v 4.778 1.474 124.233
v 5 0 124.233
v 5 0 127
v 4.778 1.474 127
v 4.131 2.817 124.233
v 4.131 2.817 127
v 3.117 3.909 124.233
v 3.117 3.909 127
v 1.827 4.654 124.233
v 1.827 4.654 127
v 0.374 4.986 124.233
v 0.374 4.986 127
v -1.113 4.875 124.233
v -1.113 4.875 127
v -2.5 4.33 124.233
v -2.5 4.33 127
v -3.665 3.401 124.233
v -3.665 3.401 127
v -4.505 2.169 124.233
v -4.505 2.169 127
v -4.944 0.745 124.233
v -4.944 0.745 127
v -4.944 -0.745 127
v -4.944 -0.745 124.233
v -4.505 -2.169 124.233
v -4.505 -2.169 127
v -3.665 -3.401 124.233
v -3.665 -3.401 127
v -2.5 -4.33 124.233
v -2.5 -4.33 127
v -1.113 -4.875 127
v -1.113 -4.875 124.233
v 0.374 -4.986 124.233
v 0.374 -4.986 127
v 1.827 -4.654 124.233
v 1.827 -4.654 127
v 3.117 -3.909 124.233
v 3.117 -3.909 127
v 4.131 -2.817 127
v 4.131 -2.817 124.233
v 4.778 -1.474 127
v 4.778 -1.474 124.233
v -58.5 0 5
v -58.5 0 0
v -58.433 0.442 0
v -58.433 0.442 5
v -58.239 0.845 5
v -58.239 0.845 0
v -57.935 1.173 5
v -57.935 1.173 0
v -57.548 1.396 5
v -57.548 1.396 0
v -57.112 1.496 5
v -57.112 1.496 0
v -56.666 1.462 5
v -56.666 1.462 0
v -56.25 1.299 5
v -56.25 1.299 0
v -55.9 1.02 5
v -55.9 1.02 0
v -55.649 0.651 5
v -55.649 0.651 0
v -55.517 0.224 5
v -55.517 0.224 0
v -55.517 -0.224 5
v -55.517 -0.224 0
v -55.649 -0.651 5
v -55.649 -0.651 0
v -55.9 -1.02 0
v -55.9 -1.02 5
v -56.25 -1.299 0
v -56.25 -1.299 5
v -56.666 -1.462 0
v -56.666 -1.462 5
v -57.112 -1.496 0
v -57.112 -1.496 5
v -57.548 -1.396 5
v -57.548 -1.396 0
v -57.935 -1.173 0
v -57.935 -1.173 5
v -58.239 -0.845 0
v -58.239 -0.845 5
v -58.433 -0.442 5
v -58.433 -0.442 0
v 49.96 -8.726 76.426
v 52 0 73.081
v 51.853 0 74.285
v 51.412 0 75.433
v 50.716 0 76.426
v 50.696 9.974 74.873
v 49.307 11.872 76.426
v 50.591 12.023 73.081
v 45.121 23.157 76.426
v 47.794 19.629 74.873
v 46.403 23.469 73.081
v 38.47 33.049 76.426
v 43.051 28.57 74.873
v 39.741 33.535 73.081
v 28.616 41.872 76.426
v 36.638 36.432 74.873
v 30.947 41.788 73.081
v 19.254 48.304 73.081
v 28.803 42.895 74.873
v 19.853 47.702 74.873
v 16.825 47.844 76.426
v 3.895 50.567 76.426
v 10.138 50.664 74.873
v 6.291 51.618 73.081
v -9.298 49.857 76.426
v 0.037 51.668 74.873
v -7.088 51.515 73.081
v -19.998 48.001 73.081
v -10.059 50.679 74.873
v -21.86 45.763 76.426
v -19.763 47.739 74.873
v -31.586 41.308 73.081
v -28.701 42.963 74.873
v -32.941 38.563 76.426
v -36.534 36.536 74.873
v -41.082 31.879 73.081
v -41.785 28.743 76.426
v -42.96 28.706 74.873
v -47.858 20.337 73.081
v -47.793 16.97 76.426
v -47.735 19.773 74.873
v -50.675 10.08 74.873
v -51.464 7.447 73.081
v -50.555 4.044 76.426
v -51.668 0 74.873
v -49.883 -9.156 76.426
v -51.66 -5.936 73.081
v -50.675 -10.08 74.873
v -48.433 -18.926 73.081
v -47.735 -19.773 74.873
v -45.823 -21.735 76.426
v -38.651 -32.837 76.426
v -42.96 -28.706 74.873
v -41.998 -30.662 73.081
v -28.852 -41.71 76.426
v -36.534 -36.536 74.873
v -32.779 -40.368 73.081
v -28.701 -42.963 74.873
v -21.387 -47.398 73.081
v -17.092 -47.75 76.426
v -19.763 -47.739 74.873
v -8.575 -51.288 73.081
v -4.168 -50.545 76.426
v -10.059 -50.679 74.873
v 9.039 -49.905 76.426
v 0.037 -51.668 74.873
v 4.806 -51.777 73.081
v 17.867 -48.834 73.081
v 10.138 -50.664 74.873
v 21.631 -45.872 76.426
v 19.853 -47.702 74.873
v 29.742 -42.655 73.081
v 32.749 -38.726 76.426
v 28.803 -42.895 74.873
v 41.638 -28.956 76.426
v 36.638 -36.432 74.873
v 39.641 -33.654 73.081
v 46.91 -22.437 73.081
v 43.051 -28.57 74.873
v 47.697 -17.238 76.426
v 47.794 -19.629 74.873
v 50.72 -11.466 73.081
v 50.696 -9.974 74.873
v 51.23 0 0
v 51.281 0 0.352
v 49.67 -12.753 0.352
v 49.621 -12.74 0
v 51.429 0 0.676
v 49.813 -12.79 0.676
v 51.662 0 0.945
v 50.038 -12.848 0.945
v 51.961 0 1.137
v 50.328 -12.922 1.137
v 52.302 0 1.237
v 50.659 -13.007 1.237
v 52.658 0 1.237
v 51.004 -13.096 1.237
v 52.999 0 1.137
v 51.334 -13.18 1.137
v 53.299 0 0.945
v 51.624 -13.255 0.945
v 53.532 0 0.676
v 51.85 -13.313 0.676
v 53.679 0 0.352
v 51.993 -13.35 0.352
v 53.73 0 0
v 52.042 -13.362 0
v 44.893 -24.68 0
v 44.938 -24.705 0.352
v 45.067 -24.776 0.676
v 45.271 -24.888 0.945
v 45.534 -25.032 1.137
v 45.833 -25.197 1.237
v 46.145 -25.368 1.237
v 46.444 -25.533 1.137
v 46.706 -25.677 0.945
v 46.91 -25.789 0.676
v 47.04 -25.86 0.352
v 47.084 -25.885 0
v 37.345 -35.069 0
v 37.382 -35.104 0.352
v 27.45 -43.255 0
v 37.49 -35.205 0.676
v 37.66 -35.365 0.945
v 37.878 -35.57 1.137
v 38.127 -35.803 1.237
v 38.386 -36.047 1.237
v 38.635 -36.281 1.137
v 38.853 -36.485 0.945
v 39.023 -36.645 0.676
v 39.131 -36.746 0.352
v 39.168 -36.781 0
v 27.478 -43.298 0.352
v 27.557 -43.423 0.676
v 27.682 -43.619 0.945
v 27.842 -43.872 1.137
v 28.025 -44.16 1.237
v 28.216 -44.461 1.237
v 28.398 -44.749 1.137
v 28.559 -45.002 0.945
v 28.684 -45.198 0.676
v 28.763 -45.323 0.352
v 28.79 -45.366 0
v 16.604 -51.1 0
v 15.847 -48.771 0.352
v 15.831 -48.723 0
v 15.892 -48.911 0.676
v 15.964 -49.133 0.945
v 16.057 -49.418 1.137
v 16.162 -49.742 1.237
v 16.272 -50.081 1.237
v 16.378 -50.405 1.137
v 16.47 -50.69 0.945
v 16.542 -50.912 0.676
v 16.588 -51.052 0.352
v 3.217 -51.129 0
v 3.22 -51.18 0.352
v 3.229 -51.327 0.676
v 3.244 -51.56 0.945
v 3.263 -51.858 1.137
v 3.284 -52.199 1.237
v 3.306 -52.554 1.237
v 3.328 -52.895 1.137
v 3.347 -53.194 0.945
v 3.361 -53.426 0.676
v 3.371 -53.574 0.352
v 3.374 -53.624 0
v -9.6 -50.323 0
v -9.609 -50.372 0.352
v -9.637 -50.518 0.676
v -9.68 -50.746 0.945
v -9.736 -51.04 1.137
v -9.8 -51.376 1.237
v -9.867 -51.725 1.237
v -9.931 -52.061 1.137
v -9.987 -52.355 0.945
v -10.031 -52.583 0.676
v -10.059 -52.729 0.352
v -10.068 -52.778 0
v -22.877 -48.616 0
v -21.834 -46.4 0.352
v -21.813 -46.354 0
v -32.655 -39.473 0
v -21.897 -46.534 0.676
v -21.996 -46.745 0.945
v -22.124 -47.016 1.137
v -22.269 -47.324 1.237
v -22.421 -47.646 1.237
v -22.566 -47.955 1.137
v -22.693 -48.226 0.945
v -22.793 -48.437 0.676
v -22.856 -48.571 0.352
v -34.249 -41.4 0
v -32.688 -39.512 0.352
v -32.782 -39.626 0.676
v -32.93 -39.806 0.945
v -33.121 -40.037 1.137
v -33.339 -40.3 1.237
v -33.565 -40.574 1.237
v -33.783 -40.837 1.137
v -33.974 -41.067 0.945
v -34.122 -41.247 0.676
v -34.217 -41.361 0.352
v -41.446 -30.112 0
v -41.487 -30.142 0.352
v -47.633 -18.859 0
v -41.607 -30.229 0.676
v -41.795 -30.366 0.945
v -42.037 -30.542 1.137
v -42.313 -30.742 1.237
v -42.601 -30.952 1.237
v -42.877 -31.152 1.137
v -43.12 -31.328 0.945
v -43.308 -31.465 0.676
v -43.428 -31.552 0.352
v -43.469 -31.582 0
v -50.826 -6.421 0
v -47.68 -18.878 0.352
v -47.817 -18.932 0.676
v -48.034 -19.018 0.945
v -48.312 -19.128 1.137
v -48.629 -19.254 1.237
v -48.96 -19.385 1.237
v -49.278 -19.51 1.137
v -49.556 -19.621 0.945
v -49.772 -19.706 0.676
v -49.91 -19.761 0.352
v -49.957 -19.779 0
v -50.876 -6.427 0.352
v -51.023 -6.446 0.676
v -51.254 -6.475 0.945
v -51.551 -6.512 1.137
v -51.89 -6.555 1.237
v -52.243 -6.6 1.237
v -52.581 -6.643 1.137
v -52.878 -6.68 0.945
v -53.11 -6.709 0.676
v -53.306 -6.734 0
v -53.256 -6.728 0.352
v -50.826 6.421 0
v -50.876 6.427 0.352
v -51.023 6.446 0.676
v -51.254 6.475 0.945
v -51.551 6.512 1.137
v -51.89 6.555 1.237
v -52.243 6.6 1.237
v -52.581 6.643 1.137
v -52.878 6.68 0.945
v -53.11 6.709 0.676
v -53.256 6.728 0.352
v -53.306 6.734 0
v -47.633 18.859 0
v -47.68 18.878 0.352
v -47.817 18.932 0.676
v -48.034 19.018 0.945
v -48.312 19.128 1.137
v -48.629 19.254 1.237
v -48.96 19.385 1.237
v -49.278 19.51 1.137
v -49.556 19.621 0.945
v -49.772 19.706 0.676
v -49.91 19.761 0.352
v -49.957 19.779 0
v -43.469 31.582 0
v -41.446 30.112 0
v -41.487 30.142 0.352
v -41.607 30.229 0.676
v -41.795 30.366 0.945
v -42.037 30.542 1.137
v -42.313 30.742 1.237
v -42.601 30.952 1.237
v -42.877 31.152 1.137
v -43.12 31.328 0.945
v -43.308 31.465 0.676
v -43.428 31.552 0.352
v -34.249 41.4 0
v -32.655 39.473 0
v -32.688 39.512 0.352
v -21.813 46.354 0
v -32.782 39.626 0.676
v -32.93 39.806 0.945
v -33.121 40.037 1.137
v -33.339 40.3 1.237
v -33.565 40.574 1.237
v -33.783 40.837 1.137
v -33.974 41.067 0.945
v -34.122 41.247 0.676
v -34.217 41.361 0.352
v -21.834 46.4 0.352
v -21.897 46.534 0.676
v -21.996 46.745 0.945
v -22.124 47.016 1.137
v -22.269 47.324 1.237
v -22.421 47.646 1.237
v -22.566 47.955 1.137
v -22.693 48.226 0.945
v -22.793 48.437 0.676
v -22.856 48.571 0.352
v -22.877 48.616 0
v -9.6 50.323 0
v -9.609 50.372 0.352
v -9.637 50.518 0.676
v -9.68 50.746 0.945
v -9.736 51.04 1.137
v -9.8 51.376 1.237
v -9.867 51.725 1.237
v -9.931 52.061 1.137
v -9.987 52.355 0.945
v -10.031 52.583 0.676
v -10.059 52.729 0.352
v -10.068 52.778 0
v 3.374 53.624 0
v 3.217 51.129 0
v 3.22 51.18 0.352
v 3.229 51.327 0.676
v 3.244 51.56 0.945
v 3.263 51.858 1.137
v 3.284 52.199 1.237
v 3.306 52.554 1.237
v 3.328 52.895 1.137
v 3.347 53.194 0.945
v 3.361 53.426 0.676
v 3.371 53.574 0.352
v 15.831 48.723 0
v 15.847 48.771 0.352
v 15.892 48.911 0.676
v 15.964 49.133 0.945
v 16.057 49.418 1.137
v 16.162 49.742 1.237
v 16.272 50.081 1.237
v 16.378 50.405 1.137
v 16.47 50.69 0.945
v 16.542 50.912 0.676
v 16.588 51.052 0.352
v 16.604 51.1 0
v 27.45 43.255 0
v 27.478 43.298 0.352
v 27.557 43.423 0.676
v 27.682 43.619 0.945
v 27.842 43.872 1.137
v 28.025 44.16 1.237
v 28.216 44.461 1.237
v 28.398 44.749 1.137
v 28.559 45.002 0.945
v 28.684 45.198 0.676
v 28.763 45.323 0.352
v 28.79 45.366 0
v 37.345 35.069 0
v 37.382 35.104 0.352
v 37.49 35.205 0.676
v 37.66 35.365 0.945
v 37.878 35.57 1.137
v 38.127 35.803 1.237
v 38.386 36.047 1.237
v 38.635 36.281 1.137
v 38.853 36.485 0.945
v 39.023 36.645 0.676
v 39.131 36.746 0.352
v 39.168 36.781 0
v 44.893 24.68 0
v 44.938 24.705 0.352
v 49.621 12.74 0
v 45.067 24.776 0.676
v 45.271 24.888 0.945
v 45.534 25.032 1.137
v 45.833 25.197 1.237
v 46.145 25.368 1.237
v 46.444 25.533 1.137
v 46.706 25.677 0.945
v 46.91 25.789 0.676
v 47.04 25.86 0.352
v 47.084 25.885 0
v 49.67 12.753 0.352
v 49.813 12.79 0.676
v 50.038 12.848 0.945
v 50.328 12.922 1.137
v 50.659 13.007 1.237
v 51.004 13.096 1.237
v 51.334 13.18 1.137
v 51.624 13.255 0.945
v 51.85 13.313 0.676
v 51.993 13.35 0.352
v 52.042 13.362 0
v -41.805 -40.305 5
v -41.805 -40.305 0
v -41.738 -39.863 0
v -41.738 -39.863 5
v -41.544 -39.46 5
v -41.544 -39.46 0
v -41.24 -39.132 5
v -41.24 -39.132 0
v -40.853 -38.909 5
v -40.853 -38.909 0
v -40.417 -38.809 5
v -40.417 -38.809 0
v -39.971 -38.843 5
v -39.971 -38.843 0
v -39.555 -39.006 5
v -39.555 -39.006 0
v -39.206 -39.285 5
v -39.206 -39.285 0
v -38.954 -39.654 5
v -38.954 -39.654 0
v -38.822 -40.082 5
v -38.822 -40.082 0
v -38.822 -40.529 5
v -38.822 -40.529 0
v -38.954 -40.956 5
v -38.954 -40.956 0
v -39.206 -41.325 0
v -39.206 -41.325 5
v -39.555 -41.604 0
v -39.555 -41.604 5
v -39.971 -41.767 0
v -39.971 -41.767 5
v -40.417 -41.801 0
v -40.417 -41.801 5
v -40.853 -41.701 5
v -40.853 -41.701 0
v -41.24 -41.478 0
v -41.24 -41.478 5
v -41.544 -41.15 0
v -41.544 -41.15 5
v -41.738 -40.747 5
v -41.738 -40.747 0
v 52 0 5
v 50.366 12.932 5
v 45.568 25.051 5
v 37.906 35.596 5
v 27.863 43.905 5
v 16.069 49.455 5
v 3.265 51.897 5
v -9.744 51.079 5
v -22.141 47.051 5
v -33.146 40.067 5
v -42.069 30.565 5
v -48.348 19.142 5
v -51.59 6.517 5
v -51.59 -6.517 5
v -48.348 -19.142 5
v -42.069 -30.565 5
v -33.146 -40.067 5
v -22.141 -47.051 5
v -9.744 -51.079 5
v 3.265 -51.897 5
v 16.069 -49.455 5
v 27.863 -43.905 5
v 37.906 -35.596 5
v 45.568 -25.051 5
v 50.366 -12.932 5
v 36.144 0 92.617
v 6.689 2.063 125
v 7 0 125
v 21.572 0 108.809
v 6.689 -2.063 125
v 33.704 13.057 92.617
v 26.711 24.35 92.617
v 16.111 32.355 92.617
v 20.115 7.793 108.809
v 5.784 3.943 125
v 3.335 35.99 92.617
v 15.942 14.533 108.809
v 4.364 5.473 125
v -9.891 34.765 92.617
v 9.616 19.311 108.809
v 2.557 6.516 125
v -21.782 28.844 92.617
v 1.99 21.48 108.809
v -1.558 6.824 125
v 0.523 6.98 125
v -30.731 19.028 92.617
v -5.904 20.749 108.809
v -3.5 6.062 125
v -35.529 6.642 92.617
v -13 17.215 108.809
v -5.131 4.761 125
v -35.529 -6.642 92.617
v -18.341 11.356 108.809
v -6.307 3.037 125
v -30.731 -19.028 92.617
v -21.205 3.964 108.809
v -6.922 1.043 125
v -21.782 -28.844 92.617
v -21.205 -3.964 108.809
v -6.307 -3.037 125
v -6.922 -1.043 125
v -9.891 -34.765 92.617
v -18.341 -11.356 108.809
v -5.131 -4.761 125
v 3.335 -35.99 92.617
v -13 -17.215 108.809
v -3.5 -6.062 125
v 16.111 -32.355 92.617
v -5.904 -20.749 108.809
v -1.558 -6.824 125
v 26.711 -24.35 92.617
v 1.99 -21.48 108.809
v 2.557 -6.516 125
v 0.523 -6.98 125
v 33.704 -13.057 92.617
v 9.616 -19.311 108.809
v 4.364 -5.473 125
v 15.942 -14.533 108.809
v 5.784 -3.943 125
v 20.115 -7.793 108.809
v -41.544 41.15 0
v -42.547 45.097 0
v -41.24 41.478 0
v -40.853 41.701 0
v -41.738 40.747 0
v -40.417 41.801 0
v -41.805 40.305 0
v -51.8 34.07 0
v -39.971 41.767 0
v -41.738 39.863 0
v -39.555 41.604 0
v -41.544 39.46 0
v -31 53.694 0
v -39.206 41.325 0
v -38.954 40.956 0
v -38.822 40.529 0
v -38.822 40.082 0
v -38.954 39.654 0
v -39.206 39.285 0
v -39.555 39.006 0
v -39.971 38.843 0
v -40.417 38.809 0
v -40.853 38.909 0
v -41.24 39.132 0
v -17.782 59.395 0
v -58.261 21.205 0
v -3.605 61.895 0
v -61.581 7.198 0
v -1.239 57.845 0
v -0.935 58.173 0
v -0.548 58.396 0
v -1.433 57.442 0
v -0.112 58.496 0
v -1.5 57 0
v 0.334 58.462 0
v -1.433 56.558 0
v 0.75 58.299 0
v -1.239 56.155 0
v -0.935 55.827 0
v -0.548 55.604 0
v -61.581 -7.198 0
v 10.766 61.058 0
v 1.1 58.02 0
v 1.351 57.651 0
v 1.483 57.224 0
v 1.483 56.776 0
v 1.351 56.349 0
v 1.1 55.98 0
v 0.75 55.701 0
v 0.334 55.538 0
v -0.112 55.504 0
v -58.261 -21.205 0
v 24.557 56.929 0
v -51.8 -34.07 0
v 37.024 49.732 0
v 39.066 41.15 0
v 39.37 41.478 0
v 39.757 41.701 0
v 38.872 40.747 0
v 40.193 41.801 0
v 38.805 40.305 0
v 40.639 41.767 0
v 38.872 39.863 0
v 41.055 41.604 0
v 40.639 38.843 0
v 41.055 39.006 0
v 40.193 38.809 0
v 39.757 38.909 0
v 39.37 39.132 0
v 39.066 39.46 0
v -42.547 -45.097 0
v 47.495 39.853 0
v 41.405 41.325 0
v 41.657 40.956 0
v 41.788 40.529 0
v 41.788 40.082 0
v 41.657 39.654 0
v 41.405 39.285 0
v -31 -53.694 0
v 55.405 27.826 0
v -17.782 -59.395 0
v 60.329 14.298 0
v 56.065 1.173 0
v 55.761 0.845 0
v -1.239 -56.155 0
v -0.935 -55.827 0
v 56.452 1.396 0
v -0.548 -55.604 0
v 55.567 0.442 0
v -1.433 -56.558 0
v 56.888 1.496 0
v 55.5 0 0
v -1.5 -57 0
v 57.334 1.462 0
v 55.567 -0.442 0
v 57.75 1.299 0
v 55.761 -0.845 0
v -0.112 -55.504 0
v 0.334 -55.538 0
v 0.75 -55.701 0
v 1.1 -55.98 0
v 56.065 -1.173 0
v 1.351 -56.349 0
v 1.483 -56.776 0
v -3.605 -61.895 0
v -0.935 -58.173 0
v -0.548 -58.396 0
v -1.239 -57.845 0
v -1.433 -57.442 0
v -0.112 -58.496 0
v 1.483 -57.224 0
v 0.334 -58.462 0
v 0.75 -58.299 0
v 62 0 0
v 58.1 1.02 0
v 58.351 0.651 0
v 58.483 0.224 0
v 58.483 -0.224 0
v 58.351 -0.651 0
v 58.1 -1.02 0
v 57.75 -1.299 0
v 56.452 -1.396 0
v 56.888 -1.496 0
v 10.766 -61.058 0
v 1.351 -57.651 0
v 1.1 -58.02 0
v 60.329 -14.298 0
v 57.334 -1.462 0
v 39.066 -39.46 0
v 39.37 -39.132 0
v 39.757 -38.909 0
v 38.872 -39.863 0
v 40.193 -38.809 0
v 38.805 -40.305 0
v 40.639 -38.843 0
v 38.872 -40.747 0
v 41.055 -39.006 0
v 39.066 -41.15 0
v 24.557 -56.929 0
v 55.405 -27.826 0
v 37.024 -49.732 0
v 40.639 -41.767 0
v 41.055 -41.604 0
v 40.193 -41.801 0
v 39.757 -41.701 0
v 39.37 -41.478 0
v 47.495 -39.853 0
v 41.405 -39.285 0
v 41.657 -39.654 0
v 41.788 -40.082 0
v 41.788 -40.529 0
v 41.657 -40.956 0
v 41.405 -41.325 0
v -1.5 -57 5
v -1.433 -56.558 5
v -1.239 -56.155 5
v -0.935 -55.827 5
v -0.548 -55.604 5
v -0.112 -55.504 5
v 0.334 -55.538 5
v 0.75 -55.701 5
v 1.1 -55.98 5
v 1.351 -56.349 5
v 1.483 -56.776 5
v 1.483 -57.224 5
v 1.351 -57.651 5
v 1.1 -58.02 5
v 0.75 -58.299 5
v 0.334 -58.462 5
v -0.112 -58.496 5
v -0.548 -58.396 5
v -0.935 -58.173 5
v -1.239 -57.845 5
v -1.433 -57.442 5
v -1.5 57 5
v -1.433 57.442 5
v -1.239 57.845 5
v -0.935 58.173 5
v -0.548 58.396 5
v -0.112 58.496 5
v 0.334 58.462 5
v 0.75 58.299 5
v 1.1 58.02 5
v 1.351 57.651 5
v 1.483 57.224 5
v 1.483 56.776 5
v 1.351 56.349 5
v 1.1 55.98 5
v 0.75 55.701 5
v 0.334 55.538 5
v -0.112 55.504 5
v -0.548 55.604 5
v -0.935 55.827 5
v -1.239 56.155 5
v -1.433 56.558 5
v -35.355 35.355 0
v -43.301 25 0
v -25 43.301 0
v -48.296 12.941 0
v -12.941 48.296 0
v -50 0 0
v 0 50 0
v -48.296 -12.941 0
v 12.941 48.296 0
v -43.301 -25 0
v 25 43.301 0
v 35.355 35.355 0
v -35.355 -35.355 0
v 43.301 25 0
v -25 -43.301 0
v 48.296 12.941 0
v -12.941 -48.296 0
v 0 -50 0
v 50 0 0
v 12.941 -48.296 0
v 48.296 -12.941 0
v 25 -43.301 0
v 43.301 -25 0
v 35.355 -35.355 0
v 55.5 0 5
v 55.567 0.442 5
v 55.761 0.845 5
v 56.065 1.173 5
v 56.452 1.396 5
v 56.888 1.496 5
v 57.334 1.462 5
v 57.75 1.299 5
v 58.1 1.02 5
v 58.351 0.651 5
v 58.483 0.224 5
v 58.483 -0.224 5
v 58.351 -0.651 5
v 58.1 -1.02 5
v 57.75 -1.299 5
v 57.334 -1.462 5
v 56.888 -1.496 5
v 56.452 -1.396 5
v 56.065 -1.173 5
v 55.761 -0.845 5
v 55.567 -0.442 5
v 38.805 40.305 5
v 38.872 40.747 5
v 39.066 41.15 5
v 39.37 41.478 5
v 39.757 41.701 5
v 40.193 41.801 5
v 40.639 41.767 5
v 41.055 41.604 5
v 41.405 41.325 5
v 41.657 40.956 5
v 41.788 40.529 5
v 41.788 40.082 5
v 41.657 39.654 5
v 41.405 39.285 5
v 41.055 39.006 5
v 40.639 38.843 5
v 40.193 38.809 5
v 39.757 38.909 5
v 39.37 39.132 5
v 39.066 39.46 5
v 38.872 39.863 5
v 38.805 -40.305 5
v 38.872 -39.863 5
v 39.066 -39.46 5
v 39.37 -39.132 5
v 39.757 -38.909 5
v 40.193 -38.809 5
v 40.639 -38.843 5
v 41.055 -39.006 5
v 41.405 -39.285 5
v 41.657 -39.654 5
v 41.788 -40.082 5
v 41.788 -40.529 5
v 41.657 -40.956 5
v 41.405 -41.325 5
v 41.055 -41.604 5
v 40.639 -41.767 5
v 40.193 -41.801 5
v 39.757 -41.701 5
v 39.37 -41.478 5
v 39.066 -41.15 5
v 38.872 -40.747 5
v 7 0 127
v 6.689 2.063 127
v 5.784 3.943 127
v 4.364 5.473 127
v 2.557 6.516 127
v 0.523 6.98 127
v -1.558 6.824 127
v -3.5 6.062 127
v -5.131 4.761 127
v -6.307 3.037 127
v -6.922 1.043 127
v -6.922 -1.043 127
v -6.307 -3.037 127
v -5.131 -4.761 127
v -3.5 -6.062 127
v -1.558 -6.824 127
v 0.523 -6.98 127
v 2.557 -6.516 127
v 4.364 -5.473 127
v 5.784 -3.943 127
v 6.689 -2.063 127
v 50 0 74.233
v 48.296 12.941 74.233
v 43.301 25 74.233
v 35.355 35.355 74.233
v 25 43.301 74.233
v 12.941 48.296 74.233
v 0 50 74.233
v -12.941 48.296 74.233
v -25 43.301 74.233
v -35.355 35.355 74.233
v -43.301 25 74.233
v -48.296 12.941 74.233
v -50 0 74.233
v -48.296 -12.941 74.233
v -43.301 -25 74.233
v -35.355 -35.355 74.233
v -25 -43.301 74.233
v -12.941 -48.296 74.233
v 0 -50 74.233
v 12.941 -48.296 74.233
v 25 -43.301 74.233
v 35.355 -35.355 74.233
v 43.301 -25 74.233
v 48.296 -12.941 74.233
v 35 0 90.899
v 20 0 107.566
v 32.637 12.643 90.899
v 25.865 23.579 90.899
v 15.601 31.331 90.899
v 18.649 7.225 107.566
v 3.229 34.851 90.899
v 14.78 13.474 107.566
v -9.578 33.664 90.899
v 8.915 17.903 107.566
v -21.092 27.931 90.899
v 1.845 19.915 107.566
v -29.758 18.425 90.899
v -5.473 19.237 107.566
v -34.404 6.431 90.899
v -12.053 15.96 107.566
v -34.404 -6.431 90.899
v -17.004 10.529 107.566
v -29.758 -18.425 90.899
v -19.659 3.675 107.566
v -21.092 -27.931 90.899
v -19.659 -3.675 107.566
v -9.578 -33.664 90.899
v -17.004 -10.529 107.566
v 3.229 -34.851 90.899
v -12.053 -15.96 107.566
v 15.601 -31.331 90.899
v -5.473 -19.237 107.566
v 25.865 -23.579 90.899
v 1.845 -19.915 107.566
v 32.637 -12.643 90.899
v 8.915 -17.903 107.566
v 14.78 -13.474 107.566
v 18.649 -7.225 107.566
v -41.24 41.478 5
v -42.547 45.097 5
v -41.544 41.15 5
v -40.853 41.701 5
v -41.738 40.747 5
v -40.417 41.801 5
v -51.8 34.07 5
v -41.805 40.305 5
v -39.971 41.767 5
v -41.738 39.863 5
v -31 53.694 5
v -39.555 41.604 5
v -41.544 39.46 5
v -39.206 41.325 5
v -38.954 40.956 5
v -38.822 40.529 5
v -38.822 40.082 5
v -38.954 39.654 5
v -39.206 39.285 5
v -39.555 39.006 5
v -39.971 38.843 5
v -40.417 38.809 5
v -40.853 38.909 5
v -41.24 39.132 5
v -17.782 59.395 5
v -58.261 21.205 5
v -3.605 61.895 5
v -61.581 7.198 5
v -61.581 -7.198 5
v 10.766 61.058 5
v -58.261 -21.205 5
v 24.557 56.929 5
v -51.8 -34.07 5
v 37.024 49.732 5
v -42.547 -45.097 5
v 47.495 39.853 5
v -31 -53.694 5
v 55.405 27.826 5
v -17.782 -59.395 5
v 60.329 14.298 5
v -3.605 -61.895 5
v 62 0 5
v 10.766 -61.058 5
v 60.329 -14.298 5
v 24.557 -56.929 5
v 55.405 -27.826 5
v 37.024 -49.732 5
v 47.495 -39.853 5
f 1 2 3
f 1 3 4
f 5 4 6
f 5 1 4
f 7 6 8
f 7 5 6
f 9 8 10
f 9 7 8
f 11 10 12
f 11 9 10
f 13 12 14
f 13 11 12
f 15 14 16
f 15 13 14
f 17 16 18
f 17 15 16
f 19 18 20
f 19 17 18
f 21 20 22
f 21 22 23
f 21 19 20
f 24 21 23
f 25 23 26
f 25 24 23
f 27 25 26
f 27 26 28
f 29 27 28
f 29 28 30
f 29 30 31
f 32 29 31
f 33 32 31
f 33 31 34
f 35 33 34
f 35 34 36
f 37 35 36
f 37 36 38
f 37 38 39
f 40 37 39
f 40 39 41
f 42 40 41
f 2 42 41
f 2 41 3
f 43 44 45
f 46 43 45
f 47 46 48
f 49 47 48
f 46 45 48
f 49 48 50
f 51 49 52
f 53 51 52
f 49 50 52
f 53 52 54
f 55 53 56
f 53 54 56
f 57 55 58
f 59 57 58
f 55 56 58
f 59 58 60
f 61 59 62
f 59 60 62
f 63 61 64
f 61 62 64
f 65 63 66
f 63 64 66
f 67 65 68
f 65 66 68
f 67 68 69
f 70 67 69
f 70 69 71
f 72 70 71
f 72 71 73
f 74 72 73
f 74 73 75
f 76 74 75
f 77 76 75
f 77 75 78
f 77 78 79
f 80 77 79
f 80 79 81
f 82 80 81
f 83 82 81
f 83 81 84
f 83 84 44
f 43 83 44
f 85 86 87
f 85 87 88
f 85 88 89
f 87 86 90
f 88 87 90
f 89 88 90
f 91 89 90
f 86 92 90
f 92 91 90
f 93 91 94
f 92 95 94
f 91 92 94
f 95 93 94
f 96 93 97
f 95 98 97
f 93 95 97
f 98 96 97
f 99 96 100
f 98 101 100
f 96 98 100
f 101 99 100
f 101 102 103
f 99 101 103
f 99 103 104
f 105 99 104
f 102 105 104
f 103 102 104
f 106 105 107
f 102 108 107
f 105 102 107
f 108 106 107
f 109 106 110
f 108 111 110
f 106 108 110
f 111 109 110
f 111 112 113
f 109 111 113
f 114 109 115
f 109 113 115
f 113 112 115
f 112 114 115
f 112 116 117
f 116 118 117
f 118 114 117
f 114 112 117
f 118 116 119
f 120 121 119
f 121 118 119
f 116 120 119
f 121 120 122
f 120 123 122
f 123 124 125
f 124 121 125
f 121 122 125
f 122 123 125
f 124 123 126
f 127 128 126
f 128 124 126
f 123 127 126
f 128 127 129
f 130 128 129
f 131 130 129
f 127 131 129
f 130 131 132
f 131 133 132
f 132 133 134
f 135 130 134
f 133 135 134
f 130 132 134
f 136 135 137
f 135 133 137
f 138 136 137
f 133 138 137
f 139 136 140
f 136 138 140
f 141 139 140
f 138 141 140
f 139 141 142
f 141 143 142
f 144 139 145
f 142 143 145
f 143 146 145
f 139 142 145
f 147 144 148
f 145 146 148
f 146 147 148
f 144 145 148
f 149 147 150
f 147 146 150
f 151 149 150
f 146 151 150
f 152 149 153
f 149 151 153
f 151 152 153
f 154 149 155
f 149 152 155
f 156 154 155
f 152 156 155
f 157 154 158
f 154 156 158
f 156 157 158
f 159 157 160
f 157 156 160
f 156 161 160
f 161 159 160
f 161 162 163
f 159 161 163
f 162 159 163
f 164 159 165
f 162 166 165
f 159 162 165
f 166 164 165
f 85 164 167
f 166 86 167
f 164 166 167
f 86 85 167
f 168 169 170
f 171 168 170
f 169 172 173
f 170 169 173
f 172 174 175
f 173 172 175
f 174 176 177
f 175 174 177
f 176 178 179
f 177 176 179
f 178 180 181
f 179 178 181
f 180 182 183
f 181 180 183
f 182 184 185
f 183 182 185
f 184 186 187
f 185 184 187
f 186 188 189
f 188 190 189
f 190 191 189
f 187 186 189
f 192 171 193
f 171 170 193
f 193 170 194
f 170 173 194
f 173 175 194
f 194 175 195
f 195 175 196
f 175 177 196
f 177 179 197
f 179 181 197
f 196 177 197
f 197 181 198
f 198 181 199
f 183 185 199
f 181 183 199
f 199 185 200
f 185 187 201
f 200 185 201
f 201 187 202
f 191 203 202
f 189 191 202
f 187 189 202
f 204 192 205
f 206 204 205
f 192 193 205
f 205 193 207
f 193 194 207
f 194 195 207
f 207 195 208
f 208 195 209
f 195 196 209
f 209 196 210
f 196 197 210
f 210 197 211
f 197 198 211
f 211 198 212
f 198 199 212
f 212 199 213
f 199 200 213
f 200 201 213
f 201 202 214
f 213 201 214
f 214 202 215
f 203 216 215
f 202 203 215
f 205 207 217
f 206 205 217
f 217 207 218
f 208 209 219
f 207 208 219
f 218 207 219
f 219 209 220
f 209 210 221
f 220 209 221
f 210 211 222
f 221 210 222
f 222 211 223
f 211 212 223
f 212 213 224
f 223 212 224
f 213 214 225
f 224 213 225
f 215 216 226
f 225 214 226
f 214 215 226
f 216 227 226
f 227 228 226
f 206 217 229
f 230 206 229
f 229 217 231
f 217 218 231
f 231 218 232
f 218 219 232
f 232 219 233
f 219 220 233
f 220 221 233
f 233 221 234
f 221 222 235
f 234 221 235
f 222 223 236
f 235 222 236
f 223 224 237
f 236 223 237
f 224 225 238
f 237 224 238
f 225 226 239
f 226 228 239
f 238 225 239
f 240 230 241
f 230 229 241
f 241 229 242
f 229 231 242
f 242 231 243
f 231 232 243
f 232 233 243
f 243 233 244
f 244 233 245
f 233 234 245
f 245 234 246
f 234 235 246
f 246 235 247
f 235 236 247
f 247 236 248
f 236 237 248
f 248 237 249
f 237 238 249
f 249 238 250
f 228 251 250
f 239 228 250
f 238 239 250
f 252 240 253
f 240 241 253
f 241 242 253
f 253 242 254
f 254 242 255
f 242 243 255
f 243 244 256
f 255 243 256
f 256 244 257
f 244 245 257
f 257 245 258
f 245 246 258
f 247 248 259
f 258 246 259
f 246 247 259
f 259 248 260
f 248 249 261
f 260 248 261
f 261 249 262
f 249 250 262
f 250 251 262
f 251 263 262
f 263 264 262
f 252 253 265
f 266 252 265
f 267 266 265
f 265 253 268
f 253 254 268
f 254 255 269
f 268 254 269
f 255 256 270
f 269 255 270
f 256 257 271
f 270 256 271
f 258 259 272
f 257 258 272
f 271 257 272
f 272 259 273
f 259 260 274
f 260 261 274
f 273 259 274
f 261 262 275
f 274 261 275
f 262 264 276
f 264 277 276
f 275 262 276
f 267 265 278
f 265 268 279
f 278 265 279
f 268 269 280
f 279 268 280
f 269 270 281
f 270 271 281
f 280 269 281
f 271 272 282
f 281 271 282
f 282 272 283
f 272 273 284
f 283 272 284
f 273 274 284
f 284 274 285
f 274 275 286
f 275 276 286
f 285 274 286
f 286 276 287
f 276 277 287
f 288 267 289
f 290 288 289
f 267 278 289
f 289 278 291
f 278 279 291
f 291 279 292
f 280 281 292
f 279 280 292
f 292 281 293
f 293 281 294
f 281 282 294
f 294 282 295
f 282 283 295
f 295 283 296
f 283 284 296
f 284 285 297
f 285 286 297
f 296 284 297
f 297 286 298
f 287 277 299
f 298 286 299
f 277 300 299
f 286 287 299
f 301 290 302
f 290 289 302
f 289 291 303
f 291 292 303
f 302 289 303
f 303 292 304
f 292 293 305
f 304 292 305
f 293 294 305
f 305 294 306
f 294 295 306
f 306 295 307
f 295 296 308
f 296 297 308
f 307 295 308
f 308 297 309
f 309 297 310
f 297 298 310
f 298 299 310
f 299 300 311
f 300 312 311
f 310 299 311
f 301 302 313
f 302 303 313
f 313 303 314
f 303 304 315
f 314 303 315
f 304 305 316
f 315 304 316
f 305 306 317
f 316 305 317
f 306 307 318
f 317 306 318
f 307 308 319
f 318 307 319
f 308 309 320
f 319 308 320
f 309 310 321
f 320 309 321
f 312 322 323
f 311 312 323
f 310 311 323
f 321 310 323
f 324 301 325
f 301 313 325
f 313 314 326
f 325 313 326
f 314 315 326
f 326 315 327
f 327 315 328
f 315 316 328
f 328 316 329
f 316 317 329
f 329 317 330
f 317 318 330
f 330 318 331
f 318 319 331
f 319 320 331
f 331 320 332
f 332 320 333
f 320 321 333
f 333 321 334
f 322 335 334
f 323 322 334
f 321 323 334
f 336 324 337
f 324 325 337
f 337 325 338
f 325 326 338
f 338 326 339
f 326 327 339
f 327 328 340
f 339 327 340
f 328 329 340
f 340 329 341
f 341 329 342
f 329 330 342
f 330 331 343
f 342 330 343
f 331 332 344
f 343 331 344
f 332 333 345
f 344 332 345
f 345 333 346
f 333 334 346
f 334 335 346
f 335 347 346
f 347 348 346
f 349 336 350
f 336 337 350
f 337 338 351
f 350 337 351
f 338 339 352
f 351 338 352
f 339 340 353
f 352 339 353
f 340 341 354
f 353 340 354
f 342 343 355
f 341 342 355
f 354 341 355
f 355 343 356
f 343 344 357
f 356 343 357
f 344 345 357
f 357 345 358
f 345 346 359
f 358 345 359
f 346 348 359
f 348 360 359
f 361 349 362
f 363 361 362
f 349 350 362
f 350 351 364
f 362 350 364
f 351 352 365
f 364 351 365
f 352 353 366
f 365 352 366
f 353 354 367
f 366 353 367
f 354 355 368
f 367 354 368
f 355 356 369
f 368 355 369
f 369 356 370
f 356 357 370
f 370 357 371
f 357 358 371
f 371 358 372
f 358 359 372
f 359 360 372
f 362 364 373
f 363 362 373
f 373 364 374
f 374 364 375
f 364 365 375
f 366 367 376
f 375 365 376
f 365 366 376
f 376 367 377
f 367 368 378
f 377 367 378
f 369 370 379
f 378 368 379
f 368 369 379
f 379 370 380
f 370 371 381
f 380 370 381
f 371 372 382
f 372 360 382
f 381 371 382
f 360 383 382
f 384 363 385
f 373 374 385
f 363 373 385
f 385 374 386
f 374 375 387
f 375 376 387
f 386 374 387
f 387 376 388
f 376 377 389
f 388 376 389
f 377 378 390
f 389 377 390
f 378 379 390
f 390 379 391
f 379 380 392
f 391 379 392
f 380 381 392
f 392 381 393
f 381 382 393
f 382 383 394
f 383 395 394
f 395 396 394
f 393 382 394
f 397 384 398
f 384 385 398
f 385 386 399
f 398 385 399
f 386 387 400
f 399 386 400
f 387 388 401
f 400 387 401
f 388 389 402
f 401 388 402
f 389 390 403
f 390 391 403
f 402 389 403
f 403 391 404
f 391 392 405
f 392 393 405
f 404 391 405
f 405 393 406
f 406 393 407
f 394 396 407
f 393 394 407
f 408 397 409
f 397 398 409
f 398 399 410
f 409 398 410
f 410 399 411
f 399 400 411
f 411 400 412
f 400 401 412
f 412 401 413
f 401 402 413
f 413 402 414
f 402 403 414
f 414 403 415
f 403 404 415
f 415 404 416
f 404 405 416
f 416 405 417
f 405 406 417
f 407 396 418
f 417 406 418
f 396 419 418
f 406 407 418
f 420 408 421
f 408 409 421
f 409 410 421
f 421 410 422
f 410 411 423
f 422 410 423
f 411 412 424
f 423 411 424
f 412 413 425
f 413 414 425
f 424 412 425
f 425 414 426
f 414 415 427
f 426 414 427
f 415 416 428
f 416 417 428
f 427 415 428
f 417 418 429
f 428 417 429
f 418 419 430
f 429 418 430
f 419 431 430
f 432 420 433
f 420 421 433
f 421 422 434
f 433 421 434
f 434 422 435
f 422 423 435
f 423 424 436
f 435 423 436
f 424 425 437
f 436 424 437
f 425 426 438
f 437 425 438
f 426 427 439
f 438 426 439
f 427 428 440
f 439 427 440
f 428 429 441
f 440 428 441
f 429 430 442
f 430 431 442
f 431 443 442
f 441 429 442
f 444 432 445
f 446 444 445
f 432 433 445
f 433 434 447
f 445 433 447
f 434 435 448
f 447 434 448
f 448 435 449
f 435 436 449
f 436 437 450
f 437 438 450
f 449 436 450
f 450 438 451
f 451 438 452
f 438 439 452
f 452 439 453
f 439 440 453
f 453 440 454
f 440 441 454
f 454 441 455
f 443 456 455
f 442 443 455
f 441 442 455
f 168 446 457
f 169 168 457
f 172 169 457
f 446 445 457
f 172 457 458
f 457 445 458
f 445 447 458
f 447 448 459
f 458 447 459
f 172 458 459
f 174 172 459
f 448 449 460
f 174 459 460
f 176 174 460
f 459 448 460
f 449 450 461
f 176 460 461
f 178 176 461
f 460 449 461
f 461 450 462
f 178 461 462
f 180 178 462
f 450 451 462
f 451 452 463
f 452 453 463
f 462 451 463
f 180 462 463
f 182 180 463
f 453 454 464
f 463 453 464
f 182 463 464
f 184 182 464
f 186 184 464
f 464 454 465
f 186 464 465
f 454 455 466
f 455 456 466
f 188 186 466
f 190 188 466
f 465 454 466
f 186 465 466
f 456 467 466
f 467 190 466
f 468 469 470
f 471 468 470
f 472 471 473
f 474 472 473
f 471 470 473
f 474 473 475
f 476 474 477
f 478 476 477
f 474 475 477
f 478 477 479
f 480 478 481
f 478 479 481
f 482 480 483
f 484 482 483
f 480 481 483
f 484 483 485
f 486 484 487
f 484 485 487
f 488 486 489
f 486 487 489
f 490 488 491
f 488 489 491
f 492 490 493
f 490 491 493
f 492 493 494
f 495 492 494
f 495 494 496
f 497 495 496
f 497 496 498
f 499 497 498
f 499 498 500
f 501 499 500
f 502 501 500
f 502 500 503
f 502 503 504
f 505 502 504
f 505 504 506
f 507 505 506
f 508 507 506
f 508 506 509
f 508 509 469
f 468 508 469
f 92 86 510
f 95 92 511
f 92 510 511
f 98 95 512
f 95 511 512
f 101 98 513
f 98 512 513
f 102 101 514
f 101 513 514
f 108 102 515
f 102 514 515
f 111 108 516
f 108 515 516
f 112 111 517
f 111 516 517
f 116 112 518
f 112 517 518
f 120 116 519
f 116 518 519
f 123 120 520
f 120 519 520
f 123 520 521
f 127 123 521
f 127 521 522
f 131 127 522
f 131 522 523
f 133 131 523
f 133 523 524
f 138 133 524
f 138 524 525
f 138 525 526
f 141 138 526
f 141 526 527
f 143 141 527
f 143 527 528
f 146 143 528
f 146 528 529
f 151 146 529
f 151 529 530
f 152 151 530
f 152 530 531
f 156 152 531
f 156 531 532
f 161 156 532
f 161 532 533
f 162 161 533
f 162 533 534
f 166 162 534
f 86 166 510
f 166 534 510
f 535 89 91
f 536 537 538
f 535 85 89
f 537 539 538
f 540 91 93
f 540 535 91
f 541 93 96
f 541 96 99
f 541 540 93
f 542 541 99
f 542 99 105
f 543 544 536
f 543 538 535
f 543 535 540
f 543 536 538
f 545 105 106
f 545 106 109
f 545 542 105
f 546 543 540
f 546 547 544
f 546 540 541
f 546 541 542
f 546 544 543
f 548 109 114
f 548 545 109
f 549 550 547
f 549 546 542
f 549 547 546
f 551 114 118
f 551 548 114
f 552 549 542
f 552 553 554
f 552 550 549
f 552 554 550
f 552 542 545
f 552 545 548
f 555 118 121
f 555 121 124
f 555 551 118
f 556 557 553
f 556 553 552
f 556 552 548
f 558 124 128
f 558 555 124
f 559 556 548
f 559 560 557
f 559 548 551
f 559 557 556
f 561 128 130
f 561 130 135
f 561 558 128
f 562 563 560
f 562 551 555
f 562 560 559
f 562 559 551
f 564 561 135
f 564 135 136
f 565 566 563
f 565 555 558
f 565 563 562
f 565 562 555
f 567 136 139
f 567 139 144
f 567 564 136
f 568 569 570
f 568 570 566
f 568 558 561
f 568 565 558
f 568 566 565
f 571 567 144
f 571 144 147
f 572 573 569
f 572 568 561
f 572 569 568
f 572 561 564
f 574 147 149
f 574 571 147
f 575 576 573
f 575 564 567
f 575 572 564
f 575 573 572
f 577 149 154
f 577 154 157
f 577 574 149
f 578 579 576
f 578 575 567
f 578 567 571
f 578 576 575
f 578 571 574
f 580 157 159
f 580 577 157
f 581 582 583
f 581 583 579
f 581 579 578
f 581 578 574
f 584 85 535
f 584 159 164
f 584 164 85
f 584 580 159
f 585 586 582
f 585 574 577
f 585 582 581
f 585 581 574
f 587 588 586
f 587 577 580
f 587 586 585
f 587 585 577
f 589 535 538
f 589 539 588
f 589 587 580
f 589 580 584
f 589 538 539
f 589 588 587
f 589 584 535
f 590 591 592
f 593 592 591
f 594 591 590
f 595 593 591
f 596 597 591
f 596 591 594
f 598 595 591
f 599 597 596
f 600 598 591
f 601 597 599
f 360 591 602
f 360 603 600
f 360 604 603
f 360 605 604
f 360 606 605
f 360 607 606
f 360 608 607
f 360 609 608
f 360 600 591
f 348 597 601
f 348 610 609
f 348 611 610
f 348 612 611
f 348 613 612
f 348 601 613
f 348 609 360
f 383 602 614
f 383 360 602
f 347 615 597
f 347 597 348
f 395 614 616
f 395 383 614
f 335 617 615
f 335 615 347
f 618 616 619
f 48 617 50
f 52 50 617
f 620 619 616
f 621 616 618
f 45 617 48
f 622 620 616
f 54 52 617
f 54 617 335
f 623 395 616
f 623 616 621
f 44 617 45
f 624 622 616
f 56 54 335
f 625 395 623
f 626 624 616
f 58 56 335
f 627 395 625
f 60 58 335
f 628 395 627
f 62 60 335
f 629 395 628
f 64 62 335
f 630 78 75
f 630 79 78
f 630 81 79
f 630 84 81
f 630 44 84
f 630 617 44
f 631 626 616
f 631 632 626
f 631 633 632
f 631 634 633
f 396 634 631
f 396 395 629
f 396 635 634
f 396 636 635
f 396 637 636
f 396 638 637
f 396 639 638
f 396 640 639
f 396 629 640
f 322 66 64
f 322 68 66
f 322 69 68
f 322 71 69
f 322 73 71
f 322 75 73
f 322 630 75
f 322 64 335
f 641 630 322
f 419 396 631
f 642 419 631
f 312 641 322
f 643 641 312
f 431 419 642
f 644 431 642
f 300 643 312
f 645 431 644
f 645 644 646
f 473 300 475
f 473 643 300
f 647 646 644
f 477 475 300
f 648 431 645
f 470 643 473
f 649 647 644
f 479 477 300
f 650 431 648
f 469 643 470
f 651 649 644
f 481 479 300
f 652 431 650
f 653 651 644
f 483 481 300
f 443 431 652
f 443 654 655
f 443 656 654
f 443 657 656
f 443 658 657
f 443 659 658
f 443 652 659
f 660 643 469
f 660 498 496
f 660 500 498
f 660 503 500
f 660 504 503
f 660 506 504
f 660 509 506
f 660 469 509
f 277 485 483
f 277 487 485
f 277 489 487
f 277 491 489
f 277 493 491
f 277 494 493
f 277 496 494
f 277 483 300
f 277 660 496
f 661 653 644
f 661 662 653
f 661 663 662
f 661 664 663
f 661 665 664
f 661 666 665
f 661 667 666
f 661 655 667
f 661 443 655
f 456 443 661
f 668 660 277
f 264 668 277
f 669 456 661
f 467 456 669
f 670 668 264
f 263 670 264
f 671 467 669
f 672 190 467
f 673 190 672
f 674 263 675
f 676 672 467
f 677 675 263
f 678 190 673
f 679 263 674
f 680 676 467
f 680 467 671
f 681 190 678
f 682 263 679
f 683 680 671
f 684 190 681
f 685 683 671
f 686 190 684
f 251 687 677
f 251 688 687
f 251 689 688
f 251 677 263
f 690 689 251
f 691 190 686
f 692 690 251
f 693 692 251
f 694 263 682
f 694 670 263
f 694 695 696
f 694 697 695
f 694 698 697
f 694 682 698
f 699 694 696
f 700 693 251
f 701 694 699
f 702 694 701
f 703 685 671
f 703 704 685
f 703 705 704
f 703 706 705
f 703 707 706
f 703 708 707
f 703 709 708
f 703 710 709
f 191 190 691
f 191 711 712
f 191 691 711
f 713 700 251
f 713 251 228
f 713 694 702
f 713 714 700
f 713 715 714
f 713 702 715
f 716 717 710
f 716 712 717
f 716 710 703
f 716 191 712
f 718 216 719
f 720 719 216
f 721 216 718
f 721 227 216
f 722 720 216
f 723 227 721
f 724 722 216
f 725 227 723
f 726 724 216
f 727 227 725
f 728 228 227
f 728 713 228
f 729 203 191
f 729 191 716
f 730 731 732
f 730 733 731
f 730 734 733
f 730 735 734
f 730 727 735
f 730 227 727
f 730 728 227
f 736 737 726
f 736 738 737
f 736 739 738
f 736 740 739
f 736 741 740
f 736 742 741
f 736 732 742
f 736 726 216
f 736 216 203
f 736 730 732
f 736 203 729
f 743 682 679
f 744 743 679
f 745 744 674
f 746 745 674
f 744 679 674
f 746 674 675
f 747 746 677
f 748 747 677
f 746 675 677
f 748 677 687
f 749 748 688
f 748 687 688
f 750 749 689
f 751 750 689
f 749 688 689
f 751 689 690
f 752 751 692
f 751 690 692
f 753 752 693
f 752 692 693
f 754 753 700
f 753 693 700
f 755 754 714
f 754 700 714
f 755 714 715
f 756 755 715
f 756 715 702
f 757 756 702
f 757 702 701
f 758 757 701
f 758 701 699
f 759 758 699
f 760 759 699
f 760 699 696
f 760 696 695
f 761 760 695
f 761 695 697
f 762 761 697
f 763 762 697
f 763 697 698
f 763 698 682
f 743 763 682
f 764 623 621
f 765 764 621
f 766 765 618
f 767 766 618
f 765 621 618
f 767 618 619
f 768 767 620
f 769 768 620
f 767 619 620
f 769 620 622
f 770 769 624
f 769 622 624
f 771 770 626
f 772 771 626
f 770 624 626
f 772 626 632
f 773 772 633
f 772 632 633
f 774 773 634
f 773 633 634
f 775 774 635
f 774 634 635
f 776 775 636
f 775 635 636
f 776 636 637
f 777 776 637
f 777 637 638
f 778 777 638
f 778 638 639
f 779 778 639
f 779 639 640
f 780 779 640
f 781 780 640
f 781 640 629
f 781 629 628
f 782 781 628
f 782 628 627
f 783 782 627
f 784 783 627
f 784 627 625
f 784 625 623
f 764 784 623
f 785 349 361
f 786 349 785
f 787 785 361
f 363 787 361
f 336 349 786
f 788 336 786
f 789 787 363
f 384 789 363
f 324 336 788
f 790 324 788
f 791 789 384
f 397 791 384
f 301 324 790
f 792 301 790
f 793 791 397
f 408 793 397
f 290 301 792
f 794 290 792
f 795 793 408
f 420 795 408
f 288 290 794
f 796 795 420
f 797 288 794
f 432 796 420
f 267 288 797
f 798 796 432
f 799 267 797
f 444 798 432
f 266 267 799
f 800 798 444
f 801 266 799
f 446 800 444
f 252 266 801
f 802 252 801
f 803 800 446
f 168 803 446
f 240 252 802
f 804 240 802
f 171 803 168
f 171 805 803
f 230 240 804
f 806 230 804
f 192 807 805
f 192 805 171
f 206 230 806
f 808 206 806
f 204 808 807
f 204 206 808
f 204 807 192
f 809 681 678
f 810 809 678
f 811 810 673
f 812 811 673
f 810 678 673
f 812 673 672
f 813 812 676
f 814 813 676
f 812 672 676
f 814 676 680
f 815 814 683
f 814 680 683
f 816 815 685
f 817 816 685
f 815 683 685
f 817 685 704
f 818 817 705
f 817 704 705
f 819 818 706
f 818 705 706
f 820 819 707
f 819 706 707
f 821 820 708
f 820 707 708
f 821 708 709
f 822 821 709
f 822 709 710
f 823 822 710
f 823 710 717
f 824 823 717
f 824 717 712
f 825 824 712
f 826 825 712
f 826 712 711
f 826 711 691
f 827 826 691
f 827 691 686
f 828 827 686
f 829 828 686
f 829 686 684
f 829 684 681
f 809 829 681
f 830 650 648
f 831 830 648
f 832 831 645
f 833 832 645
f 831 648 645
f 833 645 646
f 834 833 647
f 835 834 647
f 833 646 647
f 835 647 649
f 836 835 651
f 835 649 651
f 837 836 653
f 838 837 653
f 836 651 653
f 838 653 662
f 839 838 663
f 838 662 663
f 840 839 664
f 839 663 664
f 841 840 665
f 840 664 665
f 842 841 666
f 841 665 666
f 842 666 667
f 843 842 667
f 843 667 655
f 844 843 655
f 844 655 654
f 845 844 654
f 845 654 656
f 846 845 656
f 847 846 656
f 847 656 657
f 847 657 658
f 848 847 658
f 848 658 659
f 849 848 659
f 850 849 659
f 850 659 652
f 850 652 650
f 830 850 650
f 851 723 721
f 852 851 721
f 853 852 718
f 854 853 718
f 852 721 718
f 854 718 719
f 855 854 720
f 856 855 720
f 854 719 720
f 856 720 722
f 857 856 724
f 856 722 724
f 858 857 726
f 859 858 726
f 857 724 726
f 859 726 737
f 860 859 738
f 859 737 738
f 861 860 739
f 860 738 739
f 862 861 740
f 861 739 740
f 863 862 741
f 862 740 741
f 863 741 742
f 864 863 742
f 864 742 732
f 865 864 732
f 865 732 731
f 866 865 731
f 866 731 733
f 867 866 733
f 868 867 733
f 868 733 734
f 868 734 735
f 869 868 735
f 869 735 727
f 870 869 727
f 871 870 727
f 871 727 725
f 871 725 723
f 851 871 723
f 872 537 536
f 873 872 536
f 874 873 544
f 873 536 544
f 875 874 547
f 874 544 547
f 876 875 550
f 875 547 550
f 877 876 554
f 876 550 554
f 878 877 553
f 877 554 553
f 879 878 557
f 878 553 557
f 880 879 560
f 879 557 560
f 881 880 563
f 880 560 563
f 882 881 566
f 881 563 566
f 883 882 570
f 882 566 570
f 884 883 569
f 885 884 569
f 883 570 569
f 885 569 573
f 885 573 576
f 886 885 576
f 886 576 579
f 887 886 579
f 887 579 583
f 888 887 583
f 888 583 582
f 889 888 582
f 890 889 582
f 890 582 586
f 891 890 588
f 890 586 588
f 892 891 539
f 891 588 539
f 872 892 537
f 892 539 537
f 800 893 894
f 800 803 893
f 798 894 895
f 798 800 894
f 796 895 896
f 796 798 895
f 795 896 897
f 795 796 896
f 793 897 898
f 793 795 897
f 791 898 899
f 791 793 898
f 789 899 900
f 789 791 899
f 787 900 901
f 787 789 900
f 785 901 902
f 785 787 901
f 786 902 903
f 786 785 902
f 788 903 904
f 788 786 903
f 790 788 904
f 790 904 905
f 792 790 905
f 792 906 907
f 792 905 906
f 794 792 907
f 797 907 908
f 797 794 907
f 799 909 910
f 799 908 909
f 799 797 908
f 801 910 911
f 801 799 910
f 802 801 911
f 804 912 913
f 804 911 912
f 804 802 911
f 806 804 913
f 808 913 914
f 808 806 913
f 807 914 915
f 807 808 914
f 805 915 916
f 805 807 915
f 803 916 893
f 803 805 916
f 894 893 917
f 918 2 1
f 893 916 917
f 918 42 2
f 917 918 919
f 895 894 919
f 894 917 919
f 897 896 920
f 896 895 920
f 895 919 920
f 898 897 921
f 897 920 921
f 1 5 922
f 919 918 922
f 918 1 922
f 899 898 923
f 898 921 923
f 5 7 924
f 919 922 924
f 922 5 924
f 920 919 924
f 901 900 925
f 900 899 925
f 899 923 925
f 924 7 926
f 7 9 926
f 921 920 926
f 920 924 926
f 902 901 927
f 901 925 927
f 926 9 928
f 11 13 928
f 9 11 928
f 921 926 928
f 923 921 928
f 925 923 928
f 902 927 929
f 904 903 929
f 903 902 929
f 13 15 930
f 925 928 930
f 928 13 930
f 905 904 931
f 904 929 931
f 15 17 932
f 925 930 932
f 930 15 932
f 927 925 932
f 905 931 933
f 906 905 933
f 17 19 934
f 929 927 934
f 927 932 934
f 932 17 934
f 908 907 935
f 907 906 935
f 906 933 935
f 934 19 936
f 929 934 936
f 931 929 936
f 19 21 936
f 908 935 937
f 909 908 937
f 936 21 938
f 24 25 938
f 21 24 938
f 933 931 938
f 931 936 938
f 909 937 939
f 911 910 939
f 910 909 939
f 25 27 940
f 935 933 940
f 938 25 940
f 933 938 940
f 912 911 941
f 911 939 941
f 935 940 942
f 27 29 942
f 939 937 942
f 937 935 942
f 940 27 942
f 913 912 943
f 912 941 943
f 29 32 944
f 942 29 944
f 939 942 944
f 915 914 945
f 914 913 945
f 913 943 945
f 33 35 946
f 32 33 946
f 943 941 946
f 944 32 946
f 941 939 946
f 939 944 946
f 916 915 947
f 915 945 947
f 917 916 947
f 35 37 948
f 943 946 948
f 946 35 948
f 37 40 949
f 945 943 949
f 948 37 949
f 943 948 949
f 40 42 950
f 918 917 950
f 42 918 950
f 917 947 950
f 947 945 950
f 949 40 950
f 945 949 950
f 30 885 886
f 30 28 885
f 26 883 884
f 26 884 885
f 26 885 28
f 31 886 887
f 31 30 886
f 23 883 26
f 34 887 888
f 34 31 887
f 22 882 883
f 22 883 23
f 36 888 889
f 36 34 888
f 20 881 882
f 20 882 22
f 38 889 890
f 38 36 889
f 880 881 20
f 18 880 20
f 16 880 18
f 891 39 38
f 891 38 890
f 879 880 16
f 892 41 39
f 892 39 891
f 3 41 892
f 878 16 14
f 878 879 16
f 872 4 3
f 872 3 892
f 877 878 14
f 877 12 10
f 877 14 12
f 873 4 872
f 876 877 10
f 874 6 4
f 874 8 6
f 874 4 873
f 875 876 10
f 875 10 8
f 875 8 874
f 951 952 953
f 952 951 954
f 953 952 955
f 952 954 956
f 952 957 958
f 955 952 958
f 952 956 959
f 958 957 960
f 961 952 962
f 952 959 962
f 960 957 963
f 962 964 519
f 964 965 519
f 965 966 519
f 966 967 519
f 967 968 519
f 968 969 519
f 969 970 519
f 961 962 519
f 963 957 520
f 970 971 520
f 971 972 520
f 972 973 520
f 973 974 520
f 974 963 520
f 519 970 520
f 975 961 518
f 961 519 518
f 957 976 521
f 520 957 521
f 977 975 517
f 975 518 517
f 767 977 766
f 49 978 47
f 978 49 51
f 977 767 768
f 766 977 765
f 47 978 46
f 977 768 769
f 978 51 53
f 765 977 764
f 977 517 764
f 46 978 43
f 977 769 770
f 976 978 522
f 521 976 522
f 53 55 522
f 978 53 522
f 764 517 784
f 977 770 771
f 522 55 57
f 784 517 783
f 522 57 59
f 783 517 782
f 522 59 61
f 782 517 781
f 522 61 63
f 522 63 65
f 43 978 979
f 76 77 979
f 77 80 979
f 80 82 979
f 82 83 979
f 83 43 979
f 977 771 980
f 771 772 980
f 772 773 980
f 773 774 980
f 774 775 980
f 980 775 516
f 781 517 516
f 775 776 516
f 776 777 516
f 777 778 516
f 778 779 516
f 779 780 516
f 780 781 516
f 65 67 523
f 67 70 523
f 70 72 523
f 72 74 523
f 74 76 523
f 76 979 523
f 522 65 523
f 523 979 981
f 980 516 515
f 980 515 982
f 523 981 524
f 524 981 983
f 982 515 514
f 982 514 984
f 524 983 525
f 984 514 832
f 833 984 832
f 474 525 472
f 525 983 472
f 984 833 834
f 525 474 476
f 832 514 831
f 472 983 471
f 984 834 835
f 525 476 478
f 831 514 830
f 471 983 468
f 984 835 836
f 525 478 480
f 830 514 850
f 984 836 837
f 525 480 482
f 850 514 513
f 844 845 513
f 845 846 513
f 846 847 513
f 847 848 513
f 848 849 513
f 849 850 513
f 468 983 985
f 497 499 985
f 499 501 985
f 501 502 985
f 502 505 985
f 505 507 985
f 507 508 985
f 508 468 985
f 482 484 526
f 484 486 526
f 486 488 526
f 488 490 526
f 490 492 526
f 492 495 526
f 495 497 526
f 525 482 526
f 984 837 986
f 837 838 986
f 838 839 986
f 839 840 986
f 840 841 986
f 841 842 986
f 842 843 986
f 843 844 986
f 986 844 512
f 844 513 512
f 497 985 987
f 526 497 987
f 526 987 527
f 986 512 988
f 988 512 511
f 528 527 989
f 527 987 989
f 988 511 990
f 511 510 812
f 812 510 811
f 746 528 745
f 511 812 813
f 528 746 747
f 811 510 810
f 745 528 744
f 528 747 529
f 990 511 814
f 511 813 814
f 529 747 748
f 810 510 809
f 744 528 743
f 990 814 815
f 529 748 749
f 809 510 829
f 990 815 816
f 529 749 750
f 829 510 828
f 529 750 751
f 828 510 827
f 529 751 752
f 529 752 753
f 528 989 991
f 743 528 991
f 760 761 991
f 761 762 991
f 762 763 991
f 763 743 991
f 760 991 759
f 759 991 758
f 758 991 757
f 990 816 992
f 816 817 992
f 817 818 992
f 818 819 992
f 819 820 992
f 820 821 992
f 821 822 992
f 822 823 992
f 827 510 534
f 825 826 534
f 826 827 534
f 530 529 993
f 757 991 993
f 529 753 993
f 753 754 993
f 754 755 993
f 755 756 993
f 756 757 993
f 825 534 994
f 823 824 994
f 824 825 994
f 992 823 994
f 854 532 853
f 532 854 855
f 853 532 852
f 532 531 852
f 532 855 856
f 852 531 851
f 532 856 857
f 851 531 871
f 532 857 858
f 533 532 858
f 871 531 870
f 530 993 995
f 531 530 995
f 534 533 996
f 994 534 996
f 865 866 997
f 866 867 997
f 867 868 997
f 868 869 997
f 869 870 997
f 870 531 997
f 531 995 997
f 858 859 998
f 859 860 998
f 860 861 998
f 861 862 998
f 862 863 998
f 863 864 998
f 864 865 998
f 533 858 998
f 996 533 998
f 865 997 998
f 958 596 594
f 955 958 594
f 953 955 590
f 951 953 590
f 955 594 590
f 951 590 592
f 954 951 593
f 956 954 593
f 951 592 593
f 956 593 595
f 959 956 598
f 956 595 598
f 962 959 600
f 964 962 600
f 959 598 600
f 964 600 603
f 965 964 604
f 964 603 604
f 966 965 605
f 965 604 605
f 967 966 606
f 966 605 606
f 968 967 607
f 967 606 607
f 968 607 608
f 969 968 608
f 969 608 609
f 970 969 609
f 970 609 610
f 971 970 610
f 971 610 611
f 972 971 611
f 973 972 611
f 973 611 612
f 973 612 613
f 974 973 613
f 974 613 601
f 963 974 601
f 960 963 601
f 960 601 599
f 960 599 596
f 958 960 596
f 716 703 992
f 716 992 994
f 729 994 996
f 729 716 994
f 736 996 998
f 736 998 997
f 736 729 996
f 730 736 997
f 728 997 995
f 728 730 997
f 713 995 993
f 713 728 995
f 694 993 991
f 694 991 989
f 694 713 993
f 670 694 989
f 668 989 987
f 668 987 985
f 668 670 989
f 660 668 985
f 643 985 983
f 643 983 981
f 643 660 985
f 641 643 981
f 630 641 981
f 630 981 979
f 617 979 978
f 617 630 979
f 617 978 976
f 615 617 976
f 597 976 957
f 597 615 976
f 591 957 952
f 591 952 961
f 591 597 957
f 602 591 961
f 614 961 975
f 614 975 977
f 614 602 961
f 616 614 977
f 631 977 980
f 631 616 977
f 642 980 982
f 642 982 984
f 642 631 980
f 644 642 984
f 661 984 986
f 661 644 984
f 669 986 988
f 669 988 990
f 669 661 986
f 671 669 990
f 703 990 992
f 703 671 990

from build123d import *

# Parameters (mm, degrees)
F0_R      = 52
F1_DEPTH  = 75
F2_R      = 7
F3_DEPTH  = 2
F1_FACE_R = 52
F3_FACE_R = 7
F7_T      = -2
F8_R      = 5
F9_DEPTH  = 25
F10_R     = 62
F10_R_2   = 52
F11_DEPTH = 5
F13_D     = 3
F15_R     = 1.25
F17_R     = 5


with BuildPart() as f1:
    # F0 (on Top) → F1 (new body)
    with BuildSketch(Plane.XY):
        Circle(F0_R)
    extrude(amount=F1_DEPTH)


with BuildPart() as f3:
    # F2 (on face) → F3 (new body)
    with BuildSketch(Plane.XY.offset(75)):
        Circle(F2_R)
    extrude(amount=F3_DEPTH)


with BuildPart() as f3_1:
    # F4: moved
    add(f3.part.moved(Location((0, 0, 50))))


with BuildPart() as f5:
    # F1_face (on face) → F5 section 0
    with BuildSketch(Plane.XY.offset(75)):
        Circle(F1_FACE_R)
    # F3_face (on face) → F5 section 1
    with BuildSketch(Plane(origin=(0, 0, 125), x_dir=(1, 0, 0), z_dir=(0, 0, -1))):
        Circle(F3_FACE_R)
    loft()

    # F6: union F3, F1
    add(f3_1.part)
    add(f1.part)

    # F7
    f7_openings = [f5.faces().sort_by_distance(p)[0] for p in [
        (0, 0, 0),
    ]]
    offset(amount=F7_T, openings=f7_openings, kind=Kind.INTERSECTION)

    # F8 (on face) → F9 (cut)
    with BuildSketch(Plane.XY.offset(127)):
        Circle(F8_R)
    extrude(amount=-F9_DEPTH, mode=Mode.SUBTRACT)

    # F10 (on face) → F11 (join)
    with BuildSketch(Plane(origin=(0, 0, 0), x_dir=(1, 0, 0), z_dir=(0, 0, -1))):
        Circle(F10_R)
        Circle(F10_R_2, mode=Mode.SUBTRACT)
    extrude(amount=-F11_DEPTH)

    # F13 (through all)
    with Locations(Plane.XY.offset(5)):
        with Locations((0, 57), (40.3050865276, 40.3050865276), (57, 0), (40.3050865276, -40.3050865276), (0, -57), (-40.3050865276, -40.3050865276), (-57, 0), (-40.3050865276, 40.3050865276)):
            Hole(F13_D / 2)

    # F16: sweep along a path in F14
    with BuildLine(Plane(origin=(0, 0, 0), x_dir=(1, 0, 0), z_dir=(0, 0, -1))) as f16_path:
        CenterArc((0, 0), 52.5, 0, 360)
    # F15 (on Front) → F16 (sweep, cut)
    with BuildSketch(Plane.XZ):
        with Locations((-52.4801053107, 0)):
            Circle(F15_R)
    sweep(path=f16_path.line, mode=Mode.SUBTRACT)

    # F17
    f17_edges = [f5.edges().sort_by_distance(p)[0] for p in [
        (-52, 0, 75),
    ]]
    fillet(f17_edges, radius=F17_R)


solid = f5.part
